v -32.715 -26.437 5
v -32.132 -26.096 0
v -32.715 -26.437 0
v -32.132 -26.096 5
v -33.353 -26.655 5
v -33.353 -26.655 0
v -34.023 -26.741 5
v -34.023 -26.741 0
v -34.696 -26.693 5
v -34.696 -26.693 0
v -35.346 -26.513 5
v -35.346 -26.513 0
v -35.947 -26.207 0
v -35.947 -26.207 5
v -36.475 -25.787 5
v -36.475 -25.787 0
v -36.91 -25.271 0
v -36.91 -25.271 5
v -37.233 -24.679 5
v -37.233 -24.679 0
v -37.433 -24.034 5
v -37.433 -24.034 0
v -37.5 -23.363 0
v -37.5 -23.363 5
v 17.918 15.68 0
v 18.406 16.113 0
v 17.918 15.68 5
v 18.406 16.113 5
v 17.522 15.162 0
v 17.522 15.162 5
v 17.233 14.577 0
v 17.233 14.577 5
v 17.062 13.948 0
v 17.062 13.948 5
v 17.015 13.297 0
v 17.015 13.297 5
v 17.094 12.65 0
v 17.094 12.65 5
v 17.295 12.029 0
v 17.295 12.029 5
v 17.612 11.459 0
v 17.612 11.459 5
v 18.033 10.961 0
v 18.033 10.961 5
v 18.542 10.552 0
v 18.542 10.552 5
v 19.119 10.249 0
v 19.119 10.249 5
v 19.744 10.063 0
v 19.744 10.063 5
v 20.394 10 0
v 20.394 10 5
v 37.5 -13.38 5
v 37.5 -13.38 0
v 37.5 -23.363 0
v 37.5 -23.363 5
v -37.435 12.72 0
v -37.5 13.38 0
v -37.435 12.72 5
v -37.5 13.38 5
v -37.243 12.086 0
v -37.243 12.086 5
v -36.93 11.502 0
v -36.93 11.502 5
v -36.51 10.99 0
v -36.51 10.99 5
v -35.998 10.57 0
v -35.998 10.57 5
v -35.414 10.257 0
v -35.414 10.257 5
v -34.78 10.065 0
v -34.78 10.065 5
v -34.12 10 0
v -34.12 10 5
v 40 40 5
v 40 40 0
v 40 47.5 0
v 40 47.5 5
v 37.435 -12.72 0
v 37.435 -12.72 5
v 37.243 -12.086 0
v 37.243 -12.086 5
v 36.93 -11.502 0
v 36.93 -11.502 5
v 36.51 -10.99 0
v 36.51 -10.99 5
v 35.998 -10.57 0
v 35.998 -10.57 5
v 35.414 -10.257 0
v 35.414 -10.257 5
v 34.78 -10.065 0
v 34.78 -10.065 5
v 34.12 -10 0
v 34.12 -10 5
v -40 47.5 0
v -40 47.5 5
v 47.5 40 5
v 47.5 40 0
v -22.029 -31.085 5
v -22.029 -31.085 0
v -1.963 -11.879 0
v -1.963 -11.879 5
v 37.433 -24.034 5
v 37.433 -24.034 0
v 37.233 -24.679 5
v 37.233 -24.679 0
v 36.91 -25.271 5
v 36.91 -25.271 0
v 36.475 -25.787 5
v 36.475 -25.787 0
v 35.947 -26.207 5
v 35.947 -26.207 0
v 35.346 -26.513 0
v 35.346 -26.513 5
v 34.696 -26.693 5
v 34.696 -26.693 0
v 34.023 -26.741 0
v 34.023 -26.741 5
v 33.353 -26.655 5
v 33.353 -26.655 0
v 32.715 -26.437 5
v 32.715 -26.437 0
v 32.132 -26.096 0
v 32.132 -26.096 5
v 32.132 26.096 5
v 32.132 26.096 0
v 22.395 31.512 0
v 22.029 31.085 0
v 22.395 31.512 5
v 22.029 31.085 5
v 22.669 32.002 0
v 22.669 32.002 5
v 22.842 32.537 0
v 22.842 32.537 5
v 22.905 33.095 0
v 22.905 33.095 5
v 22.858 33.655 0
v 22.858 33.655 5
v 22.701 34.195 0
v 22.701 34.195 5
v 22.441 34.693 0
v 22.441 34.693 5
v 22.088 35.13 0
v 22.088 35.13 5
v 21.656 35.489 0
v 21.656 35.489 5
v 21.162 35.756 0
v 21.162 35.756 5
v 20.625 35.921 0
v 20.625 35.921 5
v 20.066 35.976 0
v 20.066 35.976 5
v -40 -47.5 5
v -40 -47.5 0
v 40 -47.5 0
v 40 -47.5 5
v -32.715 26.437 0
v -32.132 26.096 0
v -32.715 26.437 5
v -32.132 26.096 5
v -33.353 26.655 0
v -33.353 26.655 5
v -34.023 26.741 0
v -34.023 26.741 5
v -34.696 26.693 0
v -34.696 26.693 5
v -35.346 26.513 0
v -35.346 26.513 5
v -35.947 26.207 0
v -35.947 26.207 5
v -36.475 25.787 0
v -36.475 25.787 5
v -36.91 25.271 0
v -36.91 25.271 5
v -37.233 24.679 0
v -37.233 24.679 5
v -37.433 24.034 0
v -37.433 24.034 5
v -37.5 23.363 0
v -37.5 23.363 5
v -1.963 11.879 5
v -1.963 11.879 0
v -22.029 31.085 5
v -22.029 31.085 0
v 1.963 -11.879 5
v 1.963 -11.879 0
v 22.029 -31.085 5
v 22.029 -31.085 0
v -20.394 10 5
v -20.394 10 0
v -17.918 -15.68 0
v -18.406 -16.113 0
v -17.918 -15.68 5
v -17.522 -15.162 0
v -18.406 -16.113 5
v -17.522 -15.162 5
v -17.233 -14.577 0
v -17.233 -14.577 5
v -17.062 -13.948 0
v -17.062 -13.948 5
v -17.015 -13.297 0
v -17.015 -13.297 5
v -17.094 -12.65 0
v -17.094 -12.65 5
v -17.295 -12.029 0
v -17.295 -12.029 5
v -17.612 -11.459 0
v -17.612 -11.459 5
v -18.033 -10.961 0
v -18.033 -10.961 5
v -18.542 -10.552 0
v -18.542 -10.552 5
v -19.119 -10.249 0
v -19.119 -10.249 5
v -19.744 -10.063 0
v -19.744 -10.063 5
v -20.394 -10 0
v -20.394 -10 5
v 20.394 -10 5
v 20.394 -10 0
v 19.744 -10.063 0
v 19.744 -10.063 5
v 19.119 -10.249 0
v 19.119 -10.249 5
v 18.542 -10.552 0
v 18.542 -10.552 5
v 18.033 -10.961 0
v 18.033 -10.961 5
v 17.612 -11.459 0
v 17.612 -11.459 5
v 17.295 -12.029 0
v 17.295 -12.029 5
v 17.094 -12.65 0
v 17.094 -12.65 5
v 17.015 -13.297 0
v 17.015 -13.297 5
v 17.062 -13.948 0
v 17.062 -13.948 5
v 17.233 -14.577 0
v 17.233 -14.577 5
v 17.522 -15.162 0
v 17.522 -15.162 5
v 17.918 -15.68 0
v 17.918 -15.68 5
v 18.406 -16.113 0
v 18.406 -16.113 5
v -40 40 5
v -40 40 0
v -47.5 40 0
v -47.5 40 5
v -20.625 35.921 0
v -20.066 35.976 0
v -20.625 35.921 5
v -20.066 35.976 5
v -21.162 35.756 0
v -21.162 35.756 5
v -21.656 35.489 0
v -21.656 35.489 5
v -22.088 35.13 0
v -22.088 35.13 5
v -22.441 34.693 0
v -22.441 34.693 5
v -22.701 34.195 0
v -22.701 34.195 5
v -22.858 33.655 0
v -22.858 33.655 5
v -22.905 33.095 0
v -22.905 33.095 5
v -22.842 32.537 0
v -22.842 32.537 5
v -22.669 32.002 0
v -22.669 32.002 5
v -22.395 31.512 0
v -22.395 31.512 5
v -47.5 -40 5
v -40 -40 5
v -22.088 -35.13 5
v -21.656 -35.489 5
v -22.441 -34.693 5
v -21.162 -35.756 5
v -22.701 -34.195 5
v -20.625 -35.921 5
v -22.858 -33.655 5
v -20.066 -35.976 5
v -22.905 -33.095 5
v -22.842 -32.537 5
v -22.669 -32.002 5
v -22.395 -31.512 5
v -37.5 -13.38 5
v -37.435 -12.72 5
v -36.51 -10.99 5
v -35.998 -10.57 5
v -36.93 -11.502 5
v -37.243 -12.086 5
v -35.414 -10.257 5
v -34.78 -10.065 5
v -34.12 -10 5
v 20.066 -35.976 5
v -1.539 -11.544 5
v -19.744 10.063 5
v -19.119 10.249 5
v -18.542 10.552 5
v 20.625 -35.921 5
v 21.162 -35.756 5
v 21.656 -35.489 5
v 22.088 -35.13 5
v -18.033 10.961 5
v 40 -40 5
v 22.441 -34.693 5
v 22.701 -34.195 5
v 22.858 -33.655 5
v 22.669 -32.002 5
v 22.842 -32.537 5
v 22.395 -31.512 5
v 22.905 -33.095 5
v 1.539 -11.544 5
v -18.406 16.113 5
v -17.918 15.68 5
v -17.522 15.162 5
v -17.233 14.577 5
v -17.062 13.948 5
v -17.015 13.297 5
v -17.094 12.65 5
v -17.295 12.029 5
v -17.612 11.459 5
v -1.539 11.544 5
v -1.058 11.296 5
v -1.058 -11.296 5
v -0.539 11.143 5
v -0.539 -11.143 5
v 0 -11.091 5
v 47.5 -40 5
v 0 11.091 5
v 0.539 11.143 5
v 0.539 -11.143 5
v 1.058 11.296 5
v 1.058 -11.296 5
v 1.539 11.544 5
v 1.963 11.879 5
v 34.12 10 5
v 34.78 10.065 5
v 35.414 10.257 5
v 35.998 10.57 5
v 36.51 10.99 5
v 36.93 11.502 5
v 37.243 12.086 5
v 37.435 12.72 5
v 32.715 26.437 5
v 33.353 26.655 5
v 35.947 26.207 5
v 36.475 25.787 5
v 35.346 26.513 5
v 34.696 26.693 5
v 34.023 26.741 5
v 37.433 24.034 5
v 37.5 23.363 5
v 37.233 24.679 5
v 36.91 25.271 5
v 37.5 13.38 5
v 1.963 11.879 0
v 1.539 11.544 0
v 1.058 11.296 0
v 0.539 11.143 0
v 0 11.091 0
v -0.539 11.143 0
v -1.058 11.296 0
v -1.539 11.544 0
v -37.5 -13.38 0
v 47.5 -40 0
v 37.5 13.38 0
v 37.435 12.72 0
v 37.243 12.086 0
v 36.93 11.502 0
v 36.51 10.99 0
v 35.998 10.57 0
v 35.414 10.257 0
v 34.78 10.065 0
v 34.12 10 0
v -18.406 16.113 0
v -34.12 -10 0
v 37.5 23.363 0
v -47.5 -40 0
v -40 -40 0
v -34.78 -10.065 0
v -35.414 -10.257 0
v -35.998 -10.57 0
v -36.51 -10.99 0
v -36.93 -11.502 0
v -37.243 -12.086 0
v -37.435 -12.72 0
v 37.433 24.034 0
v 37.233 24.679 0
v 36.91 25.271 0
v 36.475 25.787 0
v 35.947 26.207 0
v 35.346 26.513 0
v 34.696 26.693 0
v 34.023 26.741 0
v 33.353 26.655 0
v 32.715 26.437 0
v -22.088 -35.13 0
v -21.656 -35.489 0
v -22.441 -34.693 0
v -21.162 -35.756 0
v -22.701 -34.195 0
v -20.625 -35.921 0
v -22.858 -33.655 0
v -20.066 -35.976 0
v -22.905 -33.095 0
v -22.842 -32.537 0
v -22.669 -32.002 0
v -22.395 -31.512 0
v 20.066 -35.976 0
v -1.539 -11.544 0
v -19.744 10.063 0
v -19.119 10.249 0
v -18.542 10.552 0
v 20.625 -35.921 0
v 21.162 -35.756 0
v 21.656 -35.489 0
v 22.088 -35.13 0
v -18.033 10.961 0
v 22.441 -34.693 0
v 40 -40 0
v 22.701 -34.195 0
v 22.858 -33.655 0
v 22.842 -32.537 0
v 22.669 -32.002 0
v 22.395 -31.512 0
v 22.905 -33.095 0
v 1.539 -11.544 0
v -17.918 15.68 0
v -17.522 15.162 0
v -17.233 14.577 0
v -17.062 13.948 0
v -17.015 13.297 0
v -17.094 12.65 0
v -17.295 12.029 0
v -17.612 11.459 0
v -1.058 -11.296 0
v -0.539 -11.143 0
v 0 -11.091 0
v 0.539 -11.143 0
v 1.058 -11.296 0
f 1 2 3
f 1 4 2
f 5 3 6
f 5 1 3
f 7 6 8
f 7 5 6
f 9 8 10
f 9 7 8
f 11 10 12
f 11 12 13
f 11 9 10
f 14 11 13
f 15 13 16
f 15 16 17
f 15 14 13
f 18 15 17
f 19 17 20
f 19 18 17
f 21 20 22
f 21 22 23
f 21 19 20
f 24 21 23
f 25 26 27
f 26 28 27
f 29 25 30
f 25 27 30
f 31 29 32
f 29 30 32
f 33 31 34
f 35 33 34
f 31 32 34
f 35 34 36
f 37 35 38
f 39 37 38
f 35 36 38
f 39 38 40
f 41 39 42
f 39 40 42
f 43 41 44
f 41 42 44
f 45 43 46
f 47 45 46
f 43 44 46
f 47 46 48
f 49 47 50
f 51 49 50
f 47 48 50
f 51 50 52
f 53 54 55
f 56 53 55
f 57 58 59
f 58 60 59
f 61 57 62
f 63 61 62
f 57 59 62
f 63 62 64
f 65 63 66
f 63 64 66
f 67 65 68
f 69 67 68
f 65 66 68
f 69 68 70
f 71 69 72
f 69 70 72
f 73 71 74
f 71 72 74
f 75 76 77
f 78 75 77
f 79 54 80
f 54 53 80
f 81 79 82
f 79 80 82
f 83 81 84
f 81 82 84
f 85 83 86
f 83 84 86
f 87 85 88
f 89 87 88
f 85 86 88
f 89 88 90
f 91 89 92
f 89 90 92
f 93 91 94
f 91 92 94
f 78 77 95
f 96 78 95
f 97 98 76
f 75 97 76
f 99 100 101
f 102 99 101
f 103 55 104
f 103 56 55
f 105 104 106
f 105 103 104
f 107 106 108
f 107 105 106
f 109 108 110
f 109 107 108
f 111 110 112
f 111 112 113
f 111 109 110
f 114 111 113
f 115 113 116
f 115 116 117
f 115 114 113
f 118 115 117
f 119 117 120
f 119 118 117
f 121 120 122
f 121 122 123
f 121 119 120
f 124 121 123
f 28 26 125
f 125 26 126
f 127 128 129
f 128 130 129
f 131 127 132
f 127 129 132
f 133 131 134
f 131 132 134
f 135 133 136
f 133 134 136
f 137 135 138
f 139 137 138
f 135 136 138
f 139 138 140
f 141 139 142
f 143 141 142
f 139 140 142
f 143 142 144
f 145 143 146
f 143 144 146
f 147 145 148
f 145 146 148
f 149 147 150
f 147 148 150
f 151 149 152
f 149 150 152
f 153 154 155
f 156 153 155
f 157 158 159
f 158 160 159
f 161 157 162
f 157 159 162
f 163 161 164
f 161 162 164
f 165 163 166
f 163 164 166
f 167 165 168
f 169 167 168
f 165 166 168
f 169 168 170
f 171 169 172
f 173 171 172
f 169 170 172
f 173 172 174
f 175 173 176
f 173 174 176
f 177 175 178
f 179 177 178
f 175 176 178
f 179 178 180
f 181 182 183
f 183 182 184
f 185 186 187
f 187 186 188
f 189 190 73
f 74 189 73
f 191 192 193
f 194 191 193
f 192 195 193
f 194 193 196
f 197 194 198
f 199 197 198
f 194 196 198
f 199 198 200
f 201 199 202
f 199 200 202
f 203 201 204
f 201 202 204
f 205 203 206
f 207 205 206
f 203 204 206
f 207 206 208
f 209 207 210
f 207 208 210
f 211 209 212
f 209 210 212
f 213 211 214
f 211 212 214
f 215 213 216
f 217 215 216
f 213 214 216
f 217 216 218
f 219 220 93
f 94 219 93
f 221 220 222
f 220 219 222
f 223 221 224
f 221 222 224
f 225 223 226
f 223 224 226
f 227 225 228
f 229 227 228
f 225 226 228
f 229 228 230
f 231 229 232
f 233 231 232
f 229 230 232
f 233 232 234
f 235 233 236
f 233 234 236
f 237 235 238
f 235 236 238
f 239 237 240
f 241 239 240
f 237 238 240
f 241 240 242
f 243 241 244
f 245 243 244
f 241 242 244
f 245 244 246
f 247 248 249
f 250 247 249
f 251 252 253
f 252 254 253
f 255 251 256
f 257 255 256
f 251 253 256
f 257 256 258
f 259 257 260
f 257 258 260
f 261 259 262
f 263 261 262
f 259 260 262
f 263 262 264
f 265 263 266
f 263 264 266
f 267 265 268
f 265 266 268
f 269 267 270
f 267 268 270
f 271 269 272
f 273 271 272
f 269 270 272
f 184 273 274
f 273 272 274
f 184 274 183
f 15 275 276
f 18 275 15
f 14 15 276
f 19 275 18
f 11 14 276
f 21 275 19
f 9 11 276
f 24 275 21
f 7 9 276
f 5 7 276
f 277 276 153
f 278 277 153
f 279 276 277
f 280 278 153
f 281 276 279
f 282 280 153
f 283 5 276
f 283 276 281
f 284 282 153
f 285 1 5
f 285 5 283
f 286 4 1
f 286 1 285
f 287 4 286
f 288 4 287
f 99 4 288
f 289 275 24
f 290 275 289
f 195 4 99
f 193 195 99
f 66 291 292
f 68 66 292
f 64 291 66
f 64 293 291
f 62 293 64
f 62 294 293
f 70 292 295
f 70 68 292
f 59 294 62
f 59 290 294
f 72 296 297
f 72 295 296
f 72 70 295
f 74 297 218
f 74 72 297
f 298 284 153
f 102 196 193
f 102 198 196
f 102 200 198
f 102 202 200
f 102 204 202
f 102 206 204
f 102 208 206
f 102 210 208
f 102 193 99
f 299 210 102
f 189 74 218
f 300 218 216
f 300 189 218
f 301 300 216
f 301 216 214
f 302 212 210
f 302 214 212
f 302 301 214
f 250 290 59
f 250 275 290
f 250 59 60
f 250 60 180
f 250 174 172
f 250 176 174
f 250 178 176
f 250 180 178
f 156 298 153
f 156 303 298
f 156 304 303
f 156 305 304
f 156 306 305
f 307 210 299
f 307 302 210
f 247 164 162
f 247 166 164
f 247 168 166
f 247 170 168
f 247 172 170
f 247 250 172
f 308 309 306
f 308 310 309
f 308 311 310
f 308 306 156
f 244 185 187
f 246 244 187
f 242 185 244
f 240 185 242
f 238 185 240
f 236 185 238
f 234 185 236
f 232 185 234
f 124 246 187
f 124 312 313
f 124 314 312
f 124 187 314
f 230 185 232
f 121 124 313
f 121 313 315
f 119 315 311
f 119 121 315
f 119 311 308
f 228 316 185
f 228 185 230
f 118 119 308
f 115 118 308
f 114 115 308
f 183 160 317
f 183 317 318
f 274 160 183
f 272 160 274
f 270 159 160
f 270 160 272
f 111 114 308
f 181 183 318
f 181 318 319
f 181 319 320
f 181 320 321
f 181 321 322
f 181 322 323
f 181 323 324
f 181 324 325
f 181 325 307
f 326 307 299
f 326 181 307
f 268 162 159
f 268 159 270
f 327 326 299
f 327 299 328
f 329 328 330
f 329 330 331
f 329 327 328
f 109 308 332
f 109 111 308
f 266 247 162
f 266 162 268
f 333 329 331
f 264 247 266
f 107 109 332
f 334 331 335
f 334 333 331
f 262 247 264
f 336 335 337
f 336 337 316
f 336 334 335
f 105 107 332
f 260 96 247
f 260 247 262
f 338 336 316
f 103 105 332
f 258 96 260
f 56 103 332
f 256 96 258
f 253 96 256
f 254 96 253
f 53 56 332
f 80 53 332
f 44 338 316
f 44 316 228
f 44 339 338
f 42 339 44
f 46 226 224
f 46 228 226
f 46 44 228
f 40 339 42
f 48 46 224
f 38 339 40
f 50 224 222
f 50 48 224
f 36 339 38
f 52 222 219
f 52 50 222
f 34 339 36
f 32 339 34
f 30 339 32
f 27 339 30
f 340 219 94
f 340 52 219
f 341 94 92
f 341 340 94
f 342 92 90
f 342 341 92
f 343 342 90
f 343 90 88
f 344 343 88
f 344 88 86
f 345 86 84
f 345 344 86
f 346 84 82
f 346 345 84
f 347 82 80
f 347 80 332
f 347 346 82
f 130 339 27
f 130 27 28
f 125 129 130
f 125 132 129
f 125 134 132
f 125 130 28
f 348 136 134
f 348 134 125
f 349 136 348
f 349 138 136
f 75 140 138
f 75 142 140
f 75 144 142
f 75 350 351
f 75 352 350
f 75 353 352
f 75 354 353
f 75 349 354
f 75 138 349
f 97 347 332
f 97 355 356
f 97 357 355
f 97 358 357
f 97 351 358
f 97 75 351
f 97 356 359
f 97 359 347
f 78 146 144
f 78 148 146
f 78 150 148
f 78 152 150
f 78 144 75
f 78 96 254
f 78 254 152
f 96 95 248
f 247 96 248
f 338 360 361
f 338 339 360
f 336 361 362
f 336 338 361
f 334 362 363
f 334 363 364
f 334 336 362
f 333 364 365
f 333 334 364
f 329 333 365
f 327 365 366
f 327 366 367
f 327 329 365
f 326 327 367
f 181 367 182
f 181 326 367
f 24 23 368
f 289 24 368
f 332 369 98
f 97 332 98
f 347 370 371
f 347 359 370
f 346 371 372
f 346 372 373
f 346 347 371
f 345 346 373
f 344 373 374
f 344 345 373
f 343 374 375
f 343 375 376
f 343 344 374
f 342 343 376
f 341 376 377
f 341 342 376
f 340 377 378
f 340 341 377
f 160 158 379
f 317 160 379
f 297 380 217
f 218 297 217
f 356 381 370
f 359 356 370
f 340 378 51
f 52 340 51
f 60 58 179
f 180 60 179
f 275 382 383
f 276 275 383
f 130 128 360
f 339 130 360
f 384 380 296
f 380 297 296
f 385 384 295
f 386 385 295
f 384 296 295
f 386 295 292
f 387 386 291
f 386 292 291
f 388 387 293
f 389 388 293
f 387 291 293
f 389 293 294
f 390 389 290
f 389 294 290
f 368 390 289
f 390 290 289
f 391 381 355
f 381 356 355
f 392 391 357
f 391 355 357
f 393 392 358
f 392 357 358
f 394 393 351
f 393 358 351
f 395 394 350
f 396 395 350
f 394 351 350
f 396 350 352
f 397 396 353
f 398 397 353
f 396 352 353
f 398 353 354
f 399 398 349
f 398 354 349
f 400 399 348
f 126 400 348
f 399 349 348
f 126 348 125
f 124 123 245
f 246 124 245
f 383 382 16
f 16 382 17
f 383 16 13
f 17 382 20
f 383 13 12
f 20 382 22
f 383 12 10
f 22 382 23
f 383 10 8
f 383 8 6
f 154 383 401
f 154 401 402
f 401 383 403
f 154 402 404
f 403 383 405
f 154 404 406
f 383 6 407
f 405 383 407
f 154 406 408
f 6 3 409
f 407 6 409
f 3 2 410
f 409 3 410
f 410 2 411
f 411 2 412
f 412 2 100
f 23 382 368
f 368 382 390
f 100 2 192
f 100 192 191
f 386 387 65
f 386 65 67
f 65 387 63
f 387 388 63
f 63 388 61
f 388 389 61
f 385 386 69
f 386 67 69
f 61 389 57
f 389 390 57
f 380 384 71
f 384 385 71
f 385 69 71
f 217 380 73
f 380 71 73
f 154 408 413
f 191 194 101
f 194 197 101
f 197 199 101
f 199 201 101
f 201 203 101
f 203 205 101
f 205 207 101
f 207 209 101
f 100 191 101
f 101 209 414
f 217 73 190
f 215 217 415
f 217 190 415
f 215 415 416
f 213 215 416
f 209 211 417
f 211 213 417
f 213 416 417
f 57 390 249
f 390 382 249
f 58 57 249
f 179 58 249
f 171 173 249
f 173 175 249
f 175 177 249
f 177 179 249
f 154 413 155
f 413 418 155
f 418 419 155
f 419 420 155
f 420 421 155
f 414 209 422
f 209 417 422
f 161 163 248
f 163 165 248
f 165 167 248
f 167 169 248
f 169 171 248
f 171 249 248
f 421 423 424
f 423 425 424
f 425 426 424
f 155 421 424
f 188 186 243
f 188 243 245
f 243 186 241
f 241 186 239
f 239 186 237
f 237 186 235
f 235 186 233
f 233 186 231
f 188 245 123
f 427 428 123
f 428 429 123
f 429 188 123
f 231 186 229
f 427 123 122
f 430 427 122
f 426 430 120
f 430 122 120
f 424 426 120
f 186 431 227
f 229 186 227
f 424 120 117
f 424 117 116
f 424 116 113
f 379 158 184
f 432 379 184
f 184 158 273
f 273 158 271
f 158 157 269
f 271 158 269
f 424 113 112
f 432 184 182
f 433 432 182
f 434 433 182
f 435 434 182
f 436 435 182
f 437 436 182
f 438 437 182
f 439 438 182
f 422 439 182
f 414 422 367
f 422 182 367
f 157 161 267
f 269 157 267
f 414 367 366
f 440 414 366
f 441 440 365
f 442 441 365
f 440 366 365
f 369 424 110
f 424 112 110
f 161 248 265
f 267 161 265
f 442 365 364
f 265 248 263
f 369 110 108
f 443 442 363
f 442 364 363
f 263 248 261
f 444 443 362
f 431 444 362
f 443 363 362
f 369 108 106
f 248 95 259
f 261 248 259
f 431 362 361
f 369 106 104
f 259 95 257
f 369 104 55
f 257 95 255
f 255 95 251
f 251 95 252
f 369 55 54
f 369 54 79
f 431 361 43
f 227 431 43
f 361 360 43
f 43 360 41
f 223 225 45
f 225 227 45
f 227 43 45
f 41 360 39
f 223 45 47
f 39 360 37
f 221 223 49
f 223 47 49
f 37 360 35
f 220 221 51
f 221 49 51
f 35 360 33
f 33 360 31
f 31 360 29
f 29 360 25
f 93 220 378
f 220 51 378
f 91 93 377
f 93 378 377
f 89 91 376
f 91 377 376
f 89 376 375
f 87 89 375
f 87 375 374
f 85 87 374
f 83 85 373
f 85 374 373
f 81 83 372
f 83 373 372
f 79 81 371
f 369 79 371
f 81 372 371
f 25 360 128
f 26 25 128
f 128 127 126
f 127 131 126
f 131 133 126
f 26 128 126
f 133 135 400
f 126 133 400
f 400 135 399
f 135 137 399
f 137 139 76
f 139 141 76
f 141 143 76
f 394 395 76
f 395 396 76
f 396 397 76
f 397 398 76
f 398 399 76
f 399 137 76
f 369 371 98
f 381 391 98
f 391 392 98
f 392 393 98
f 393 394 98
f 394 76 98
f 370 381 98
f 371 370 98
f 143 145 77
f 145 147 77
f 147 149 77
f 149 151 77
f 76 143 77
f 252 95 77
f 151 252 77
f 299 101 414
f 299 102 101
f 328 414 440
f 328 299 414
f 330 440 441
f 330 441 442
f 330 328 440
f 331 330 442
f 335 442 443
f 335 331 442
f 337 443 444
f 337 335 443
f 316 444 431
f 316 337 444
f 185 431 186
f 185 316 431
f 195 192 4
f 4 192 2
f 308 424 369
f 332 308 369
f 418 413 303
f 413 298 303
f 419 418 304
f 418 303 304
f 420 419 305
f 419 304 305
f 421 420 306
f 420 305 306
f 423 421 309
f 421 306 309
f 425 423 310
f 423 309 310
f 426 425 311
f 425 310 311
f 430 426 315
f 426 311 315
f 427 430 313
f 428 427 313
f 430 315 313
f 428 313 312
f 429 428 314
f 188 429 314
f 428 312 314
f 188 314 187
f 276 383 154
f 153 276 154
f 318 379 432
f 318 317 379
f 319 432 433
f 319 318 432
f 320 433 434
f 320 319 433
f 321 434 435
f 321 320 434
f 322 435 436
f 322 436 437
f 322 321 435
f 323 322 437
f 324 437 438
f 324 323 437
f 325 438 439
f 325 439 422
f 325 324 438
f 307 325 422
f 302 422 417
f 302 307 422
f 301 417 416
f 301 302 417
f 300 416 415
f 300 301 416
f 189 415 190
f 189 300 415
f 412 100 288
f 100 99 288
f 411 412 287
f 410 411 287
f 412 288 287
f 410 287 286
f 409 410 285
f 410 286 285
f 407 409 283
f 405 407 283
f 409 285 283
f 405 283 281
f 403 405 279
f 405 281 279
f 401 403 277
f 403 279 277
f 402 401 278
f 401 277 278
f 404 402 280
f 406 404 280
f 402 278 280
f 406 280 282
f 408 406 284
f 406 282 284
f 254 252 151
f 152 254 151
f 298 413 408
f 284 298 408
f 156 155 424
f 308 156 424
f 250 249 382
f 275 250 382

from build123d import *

# Parameters (mm, degrees)
F1_DEPTH = 5
F2_R     = 2.839641
F3_R     = 3.37981


with BuildPart() as f1:
    # F0 (on Top) → F1 (new body)
    with BuildSketch(Plane.XY):
        Polygon((-40, -47.5), (40, -47.5), (40, -40), (47.5, -40), (47.5, 40), (40, 40), (40, 47.5), (-40, 47.5), (-40, 40), (-47.5, 40), (-47.5, -40), (-40, -40), align=None)
        Polygon((-37.5, -30), (-37.5, -10), (-10, -10), align=None, mode=Mode.SUBTRACT)
        Polygon((0, -10), (27.139446, -35.976308), (-27.139446, -35.976308), align=None, mode=Mode.SUBTRACT)
        Polygon((37.5, -30), (10, -10), (37.5, -10), align=None, mode=Mode.SUBTRACT)
        Polygon((-10, 10), (-37.5, 10), (-37.5, 30), align=None, mode=Mode.SUBTRACT)
        Polygon((0, 10), (-27.139446, 35.976308), (27.139446, 35.976308), align=None, mode=Mode.SUBTRACT)
        Polygon((37.5, 10), (10, 10), (37.5, 30), align=None, mode=Mode.SUBTRACT)
    extrude(amount=F1_DEPTH)

    # F2
    f2_edges = [f1.edges().sort_by_distance(p)[0] for p in [
        (27.139446, 35.976308, 2.5),
        (-27.139446, 35.976308, 2.5),
        (0, 10, 2.5),
        (0, -10, 2.5),
        (-27.139446, -35.976308, 2.5),
        (27.139446, -35.976308, 2.5),
    ]]
    fillet(f2_edges, radius=F2_R)

    # F3
    f3_edges = [f1.edges().sort_by_distance(p)[0] for p in [
        (37.5, 30, 2.5),
        (37.5, 10, 2.5),
        (10, -10, 2.5),
        (-37.5, -10, 2.5),
        (-10, -10, 2.5),
        (37.5, -10, 2.5),
        (-37.5, 30, 2.5),
        (37.5, -30, 2.5),
        (-10, 10, 2.5),
        (-37.5, 10, 2.5),
        (-37.5, -30, 2.5),
        (10, 10, 2.5),
    ]]
    fillet(f3_edges, radius=F3_R)


solid = f1.part
